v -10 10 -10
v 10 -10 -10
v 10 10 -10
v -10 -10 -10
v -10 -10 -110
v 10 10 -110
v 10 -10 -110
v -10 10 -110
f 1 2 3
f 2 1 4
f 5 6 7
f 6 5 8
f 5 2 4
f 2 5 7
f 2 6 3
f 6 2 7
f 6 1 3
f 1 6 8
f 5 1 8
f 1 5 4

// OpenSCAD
color("white")
	translate([0,0,-60])
		cube([20,20,100], center=true);
